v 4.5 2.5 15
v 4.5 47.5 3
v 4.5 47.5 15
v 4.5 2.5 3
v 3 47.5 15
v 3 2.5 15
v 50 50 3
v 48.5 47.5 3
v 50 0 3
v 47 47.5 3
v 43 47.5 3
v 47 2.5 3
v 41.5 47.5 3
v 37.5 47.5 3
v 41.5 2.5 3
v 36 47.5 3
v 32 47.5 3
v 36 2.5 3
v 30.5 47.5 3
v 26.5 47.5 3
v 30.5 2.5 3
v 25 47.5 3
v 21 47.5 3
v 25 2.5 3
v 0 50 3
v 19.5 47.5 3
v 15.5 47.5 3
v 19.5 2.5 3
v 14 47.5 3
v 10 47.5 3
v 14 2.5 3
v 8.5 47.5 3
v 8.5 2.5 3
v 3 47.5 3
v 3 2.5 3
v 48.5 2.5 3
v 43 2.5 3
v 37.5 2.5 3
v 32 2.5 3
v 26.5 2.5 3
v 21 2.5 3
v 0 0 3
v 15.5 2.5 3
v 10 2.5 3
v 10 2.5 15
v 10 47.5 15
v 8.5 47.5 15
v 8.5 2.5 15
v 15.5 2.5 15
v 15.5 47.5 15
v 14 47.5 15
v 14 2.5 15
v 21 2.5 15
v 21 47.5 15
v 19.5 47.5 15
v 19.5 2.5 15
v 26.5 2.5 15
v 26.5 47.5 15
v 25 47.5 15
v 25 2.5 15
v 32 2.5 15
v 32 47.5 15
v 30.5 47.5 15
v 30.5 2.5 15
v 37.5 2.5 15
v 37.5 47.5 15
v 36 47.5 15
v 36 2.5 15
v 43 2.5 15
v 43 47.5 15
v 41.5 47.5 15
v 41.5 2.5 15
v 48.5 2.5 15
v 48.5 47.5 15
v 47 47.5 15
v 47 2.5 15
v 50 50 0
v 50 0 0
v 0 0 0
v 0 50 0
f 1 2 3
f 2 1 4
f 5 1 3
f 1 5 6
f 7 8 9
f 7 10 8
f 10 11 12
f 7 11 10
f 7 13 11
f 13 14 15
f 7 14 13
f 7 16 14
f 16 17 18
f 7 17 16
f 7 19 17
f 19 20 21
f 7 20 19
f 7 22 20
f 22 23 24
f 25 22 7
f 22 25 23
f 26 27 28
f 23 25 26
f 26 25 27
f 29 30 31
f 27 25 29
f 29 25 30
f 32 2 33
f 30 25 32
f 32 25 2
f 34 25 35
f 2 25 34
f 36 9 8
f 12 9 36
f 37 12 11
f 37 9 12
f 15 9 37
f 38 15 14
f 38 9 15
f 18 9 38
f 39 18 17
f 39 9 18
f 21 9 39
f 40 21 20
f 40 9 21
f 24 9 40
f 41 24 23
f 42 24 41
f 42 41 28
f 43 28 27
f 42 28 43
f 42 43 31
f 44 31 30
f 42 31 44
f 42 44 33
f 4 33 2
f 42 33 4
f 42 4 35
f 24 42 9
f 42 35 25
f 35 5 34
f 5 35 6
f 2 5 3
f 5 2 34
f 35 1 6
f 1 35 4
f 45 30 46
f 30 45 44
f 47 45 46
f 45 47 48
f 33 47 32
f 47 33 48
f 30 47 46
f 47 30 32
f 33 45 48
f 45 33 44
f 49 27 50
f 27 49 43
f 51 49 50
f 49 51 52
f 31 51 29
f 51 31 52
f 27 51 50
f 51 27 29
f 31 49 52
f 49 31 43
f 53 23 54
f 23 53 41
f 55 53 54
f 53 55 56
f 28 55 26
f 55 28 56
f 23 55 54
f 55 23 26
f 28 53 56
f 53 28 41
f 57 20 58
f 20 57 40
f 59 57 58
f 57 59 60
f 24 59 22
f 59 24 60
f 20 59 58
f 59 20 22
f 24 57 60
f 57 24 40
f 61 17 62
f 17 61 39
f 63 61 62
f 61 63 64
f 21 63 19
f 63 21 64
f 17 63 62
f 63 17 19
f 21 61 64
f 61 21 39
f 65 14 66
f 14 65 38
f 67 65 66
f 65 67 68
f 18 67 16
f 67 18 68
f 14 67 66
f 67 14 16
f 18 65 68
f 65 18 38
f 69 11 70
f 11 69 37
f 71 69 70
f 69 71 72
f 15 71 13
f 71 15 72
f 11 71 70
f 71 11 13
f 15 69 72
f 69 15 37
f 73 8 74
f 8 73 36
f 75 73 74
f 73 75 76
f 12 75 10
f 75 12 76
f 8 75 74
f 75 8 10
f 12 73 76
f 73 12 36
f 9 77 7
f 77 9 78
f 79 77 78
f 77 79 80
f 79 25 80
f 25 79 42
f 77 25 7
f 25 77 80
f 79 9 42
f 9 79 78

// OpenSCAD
$fn=64;
module heat_spreader() {
  union() {
    cube([50,50,3]);
    for(i=[0:8]) translate([3+i*5.5,2.5,3]) cube([1.5,45,12]);
  }
}
heat_spreader();
